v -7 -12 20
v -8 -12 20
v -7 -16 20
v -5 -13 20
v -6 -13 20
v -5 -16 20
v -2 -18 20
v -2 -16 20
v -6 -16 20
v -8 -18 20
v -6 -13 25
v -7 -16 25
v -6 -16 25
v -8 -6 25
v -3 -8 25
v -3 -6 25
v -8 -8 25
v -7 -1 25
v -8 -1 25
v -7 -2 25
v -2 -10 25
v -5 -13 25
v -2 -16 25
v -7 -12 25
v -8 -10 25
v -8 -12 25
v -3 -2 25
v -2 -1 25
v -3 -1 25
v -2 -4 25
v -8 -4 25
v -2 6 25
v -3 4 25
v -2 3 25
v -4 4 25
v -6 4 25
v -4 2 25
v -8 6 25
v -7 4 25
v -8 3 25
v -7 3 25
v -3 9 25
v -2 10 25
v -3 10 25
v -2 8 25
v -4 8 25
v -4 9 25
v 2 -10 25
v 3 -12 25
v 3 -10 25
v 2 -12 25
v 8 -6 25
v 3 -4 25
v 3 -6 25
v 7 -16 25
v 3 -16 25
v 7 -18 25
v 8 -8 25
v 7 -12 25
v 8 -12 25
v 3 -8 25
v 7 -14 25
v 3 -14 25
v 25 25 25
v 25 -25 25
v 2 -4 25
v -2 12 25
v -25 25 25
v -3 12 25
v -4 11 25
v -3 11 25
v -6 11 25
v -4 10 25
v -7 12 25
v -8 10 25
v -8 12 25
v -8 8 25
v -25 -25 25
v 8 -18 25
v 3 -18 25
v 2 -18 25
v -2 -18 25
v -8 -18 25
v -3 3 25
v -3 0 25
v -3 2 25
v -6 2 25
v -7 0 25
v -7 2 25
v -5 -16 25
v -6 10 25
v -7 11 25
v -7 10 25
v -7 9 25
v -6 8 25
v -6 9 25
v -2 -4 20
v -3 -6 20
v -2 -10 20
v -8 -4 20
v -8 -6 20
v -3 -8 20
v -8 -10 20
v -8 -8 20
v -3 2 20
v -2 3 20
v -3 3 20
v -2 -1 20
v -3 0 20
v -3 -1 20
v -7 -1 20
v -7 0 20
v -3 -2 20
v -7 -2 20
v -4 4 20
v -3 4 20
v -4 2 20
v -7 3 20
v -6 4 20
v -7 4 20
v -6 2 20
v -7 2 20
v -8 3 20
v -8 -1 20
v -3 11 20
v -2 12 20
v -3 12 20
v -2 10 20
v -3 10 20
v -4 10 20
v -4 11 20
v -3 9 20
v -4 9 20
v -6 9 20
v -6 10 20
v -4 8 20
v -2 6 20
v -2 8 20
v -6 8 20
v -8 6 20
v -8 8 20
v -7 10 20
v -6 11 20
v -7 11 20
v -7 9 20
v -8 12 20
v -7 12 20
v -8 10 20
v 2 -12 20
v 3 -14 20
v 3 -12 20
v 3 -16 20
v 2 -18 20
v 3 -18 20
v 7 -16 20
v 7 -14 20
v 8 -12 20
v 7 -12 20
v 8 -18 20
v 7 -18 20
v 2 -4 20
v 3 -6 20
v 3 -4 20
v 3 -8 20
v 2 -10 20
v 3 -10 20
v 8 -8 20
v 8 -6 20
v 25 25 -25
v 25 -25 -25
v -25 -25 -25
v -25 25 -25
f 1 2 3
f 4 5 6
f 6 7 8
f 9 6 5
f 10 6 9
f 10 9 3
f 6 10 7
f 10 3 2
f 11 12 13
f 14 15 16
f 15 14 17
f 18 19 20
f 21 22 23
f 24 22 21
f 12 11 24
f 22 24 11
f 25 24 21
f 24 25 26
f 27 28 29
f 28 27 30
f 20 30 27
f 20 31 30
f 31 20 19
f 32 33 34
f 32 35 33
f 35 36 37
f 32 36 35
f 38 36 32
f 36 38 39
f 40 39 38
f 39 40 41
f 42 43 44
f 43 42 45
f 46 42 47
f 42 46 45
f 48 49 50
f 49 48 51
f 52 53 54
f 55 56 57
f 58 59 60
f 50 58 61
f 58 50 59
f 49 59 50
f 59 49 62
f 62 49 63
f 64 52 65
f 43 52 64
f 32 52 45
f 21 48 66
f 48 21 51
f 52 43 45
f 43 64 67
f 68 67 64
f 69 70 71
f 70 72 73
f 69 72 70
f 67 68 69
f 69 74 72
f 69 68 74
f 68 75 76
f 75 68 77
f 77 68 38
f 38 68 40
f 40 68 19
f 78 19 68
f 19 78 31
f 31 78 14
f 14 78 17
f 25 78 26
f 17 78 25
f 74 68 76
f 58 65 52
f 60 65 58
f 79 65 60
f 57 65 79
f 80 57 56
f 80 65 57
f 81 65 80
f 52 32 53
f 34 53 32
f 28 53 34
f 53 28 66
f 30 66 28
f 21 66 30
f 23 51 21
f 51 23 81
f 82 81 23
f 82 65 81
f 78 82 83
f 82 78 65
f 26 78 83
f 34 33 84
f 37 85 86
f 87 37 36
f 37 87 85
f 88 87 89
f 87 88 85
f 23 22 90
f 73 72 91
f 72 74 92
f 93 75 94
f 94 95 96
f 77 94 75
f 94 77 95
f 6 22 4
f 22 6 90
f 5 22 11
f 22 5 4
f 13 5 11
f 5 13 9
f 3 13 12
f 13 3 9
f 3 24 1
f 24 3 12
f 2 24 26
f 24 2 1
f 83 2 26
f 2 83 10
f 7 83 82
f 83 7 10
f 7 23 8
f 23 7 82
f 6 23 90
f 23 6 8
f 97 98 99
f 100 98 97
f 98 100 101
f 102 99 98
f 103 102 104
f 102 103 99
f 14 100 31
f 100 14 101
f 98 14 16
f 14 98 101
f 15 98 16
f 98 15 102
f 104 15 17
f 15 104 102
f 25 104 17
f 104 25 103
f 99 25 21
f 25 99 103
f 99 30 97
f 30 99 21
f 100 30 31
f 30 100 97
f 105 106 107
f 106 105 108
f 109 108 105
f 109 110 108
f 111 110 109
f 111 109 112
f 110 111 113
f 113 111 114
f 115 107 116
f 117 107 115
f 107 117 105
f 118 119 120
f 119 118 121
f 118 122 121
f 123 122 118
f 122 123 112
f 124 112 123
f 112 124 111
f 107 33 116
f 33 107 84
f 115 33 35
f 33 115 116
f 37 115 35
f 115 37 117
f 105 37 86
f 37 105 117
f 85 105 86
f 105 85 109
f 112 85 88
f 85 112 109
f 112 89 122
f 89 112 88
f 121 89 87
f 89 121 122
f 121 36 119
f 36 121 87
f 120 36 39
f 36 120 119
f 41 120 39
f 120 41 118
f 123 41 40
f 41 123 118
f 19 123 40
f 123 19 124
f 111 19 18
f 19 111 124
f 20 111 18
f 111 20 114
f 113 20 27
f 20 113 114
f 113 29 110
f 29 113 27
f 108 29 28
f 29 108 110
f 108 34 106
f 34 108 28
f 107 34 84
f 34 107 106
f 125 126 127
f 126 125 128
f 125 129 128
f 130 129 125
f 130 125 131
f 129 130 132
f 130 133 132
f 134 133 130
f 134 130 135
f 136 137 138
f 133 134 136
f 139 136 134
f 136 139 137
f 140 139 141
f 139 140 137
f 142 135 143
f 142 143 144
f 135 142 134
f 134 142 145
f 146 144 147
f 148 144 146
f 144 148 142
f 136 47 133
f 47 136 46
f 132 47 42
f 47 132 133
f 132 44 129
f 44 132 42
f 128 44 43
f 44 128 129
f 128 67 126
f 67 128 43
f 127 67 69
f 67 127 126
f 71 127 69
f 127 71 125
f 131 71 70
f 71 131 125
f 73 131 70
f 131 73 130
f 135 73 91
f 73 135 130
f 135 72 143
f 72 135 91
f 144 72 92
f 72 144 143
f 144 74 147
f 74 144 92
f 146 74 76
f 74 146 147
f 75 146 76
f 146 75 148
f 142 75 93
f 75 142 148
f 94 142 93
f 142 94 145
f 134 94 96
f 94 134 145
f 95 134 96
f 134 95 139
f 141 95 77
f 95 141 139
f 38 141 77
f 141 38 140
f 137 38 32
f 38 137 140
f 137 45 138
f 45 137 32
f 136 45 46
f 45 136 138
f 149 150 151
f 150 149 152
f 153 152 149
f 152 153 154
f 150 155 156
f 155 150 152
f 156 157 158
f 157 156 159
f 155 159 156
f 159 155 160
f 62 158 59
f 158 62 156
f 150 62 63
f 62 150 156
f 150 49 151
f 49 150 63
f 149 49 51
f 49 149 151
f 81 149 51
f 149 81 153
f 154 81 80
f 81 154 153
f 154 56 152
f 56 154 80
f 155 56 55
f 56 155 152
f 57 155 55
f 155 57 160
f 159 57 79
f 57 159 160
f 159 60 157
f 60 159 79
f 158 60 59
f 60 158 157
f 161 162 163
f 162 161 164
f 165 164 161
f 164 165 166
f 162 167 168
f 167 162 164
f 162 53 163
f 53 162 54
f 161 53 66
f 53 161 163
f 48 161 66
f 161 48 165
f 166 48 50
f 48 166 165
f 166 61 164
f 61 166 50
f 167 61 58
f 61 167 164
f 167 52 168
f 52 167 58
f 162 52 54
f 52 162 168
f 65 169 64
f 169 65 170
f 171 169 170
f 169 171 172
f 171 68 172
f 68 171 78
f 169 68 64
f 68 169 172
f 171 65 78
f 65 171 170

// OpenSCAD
use <MCAD/fonts.scad>

thisFont=8bit_polyfont();
x_shift=thisFont[0][0];
y_shift=thisFont[0][1];

word=["FUCK"];
word2=["IT"];

module fuck(word_offset=20.0,word_height=2.0) {
  for(i=[0:(len(word)-1)]) assign( hourHandAngle=(i+1)*360/len(word), theseIndicies=search(word[i],thisFont[2],1,1) ) {
    rotate(90-hourHandAngle) translate([word_offset,0])
      for( j=[0:(len(theseIndicies)-1)] ) translate([j*x_shift,-y_shift/2]) {
        linear_extrude(height=word_height) polygon(points=thisFont[2][theseIndicies[j]][6][0],paths=thisFont[2][theseIndicies[j]][6][1]);
      }
  }
}

module you(word_offset=20.0,word_height=2.0) {
  for(i=[0:(len(word2)-1)]) assign( hourHandAngle=(i+1)*360/len(word2), theseIndicies=search(word2[i],thisFont[2],1,1) ) {
    rotate(90-hourHandAngle) translate([word_offset,0])
      for( j=[0:(len(theseIndicies)-1)] ) translate([j*x_shift,-y_shift/2]) {
        linear_extrude(height=word_height) polygon(points=thisFont[2][theseIndicies[j]][6][0],paths=thisFont[2][theseIndicies[j]][6][1]);
      }
  }
}

difference() {
	cube(50, center=true);
	translate([-5,-35,20])
		fuck(word_offset=16.0,word_height=5.0);
	translate([5,-35,20])
		you(word_offset=16.0,word_height=5.0);
}
